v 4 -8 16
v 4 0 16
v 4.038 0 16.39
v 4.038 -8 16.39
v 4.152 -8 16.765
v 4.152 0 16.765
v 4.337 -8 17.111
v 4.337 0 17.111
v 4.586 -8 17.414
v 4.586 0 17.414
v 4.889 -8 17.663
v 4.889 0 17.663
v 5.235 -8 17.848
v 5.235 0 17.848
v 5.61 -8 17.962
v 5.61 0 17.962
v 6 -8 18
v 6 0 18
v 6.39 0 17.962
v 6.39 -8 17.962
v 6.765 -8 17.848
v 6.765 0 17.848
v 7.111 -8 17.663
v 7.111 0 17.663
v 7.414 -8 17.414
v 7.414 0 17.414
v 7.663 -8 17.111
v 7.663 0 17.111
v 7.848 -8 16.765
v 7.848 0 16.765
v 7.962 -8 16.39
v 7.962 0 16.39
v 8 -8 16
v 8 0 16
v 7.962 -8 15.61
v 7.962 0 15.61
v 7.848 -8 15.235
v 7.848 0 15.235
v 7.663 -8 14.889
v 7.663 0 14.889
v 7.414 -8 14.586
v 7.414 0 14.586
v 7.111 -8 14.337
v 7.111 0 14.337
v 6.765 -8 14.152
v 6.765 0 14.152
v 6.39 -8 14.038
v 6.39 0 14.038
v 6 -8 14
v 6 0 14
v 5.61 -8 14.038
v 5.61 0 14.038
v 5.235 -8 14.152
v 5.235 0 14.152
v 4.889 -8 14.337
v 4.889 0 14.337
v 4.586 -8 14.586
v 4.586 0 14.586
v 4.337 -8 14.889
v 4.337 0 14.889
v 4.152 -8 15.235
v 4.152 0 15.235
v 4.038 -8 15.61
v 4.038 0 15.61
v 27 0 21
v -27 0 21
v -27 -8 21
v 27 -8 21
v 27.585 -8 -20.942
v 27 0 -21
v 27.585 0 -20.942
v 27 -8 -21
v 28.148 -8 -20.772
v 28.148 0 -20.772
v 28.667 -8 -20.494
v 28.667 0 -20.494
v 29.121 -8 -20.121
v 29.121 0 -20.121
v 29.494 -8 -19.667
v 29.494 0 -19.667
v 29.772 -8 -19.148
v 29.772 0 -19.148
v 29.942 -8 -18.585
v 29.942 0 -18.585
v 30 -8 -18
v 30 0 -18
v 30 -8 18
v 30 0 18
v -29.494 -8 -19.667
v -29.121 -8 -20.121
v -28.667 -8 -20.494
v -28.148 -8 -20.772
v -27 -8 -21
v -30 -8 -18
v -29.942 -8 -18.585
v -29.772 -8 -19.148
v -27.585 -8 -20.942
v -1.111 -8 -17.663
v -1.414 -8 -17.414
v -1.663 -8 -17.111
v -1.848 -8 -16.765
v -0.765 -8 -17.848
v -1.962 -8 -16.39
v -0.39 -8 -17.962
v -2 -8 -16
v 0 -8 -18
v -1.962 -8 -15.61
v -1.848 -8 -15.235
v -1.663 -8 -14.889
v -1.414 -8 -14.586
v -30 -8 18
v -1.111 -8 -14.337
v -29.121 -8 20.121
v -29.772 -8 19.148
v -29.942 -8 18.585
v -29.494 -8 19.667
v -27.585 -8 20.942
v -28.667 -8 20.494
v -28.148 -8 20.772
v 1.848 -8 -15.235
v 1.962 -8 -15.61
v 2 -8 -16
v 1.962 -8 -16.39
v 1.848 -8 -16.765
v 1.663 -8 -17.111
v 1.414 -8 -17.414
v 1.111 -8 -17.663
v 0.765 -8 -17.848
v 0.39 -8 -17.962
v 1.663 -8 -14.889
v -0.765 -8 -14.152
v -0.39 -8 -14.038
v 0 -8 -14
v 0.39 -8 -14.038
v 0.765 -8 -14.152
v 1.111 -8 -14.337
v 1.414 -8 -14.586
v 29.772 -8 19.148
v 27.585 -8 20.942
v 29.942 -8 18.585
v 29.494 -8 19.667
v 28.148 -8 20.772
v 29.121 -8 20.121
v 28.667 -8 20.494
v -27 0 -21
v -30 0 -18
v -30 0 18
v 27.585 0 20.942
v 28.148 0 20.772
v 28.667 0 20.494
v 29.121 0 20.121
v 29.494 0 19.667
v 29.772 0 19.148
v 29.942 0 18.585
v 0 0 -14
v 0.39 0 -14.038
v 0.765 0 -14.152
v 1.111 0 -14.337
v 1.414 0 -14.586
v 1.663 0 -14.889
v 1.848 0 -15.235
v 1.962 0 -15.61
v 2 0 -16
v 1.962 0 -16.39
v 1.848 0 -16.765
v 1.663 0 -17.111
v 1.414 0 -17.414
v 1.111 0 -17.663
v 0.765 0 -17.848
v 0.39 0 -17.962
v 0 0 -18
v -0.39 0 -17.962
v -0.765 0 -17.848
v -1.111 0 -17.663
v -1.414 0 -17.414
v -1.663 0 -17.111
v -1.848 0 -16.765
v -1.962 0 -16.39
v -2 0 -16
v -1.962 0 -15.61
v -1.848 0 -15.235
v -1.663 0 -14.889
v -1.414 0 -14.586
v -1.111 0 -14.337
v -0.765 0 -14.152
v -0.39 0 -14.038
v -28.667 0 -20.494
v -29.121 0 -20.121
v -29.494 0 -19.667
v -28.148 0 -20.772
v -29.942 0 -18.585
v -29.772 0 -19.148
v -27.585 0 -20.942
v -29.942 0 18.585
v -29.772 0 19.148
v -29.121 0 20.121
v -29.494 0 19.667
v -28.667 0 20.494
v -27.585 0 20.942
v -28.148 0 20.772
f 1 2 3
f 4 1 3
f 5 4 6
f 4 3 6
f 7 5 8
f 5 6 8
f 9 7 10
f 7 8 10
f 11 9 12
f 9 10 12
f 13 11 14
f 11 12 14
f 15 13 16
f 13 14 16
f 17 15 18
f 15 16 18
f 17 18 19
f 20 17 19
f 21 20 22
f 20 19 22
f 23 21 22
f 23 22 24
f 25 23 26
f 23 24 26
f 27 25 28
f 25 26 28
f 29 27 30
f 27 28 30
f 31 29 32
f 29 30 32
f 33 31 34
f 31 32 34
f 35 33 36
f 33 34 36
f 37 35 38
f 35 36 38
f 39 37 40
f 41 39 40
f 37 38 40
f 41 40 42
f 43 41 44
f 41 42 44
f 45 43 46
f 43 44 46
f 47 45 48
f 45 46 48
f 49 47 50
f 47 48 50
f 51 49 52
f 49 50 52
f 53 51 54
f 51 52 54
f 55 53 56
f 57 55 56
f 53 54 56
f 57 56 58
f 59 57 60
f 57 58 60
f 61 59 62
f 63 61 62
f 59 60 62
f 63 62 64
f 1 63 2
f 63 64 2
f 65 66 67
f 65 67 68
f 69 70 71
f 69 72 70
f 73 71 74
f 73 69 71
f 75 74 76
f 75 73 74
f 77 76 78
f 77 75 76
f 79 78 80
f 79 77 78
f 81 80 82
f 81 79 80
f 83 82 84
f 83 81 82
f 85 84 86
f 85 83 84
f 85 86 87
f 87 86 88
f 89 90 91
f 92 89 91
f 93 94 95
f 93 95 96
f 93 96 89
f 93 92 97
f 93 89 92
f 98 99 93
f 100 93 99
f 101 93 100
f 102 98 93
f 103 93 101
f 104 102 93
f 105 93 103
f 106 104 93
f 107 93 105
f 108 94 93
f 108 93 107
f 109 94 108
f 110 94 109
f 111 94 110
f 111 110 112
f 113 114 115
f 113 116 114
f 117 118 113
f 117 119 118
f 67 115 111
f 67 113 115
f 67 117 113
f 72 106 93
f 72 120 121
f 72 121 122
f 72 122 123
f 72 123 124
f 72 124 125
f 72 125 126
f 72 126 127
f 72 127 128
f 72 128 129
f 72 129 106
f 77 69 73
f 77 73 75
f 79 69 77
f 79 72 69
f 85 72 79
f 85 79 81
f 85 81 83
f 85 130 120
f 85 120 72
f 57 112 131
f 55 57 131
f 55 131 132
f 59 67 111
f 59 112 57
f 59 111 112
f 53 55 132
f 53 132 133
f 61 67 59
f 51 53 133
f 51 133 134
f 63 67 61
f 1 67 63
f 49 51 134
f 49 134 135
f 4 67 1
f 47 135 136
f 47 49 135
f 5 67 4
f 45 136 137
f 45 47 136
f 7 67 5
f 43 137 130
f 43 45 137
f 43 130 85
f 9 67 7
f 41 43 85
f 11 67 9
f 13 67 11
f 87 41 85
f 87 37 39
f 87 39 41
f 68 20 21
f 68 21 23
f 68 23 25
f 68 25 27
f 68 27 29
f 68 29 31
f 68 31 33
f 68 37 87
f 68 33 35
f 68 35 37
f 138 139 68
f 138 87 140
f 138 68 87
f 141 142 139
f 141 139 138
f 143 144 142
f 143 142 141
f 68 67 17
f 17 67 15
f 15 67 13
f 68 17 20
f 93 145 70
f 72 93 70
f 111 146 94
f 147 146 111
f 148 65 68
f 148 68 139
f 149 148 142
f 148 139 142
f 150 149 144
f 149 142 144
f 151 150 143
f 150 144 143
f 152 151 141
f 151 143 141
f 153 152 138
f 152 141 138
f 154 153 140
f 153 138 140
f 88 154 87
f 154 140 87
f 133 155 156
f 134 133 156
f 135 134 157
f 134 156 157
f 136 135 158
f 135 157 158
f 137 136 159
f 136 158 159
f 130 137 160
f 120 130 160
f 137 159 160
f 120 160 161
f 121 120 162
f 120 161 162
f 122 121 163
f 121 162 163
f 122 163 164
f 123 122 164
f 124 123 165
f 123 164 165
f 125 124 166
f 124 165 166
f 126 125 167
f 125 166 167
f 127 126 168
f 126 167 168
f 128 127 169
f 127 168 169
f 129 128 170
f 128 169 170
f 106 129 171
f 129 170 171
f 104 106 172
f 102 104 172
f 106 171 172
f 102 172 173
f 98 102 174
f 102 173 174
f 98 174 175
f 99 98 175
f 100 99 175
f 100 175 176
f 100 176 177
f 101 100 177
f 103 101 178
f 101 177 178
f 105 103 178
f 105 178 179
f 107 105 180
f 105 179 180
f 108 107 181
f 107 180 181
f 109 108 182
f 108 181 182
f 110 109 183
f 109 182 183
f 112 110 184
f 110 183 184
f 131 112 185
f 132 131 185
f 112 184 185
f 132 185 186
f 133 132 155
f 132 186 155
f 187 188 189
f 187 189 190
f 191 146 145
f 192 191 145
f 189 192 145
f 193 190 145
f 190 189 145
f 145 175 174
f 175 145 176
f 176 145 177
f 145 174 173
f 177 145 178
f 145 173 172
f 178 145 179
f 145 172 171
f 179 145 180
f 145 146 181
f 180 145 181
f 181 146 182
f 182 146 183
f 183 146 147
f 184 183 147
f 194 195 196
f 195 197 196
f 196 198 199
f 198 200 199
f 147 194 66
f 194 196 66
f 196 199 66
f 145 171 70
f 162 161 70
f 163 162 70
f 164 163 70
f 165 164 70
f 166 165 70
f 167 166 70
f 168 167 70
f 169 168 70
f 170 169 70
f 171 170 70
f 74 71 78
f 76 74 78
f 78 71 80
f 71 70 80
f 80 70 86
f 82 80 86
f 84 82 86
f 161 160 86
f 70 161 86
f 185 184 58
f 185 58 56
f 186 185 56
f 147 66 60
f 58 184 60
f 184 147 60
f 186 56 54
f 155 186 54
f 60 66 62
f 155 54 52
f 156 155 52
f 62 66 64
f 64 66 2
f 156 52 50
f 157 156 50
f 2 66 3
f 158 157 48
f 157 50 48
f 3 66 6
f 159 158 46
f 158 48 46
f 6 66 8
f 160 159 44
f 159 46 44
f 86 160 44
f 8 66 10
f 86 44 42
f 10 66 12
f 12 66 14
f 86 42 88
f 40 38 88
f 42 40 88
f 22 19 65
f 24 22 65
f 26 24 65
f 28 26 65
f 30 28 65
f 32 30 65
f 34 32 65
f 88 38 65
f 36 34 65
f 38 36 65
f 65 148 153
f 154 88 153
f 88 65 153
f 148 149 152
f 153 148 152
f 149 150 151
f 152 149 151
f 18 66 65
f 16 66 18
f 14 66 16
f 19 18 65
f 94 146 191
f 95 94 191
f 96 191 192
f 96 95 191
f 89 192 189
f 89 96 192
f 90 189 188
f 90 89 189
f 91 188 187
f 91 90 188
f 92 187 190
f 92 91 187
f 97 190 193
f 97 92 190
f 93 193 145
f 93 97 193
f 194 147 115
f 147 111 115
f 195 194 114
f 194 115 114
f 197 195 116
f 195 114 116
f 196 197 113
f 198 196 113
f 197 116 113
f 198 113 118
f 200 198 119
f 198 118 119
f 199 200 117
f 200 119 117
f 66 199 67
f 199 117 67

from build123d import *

# Parameters (mm, degrees)
F0_W      = 5
F0_H      = 2.8
F1_DEPTH  = 6.3
F2_W      = 46
F2_H      = 23
F3_DEPTH  = 16
F5_W      = 4
F5_H      = 7.5
F6_DEPTH  = 25
F9_R      = 1.5
F10_W     = 46
F10_H     = 42
F11_DEPTH = 3
F13_R     = 3
F14_W     = 60
F14_H     = 42
F15_DEPTH = 8
F16_R     = 3


with BuildPart() as f1:
    # F0 (on Front) → F1 (new body, symmetric)
    with BuildSketch(Plane.XZ):
        with Locations((14, 6.1)):
            Rectangle(F0_W, F0_H)
        with Locations((-14, 6.1)):
            Rectangle(F0_W, F0_H)
        Polygon((-11.5, -11.5), (11.5, -11.5), (11.5, 4.7), (11.5, 7.5), (11.5, 11.5), (-11.5, 11.5), (-11.5, 7.5), (-11.5, 4.7), align=None)
    extrude(amount=F1_DEPTH, both=True)


with BuildPart() as f3:
    # F2 (on Front) → F3 (new body)
    with BuildSketch(Plane.XZ):
        Rectangle(F2_W, F2_H)
    extrude(amount=F3_DEPTH)


with BuildPart() as f3_1:
    # F4: moved
    add(f3.part.moved(Location((0, 9.75, 0))))


with BuildPart() as f6:
    # F5 (on Front) → F6 (new body)
    with BuildSketch(Plane.XZ):
        with Locations((13.5, -7.75)):
            Rectangle(F5_W, F5_H)
    extrude(amount=F6_DEPTH)


with BuildPart() as f6_1:
    # F7: moved
    add(f6.part.moved(Location((0, 4, 0))))


with BuildPart() as f3_2:
    add(f3_1.part)

    # F8: cut F6, F1
    add(f6_1.part, mode=Mode.SUBTRACT)
    add(f1.part, mode=Mode.SUBTRACT)

    # F9
    f9_edges = [f3_2.edges().sort_by_distance(p)[0] for p in [
        (-23, -6.25, 0),
        (23, -6.25, 0),
        (23, 1.75, 11.5),
        (-23, 1.75, 11.5),
        (-17.25, -6.25, 11.5),
        (17.25, -6.25, 11.5),
        (23, 1.75, -11.5),
        (19.25, -6.25, -11.5),
        (-23, 1.75, -11.5),
        (-17.25, -6.25, -11.5),
    ]]
    fillet(f9_edges, radius=F9_R)


with BuildPart() as f11:
    # F10 (on Front) → F11 (new body)
    with BuildSketch(Plane.XZ):
        Rectangle(F10_W, F10_H)
        with BuildLine():
            Line((-18, -14), (0, -14))
            Line((0, -14), (18, -14))
            ThreePointArc((18, -14), (20, -16), (18, -18))
            Line((18, -18), (-18, -18))
            ThreePointArc((-18, -18), (-20, -16), (-18, -14))
        make_face(mode=Mode.SUBTRACT)
        with BuildLine():
            Line((18, 14), (0, 14))
            Line((0, 14), (-18, 14))
            ThreePointArc((-18, 14), (-20, 16), (-18, 18))
            Line((-18, 18), (18, 18))
            ThreePointArc((18, 18), (20, 16), (18, 14))
        make_face(mode=Mode.SUBTRACT)
    extrude(amount=F11_DEPTH)


with BuildPart() as f11_1:
    # F12: moved
    add(f11.part.moved(Location((0, 12, 0))))

    # F13
    f13_edges = [f11_1.edges().sort_by_distance(p)[0] for p in [
        (-23, 10.5, 21),
        (23, 10.5, 21),
        (23, 10.5, -21),
        (-23, 10.5, -21),
    ]]
    fillet(f13_edges, radius=F13_R)


with BuildPart() as f15:
    # F14 (on Front) → F15 (new body)
    with BuildSketch(Plane.XZ):
        Rectangle(F14_W, F14_H)
        with BuildLine():
            ThreePointArc((2, -16), (-1.4142135624, -17.4142135624), (0, -14))
            ThreePointArc((0, -14), (1.4142135624, -14.5857864376), (2, -16))
        make_face(mode=Mode.SUBTRACT)
        with BuildLine():
            ThreePointArc((8, 16), (6, 14), (4, 16))
            ThreePointArc((4, 16), (6, 18), (8, 16))
        make_face(mode=Mode.SUBTRACT)
    extrude(amount=F15_DEPTH)

    # F16
    f16_edges = [f15.edges().sort_by_distance(p)[0] for p in [
        (30, -4, -21),
        (-30, -4, -21),
        (-30, -4, 21),
        (30, -4, 21),
    ]]
    fillet(f16_edges, radius=F16_R)


solid = f15.part
